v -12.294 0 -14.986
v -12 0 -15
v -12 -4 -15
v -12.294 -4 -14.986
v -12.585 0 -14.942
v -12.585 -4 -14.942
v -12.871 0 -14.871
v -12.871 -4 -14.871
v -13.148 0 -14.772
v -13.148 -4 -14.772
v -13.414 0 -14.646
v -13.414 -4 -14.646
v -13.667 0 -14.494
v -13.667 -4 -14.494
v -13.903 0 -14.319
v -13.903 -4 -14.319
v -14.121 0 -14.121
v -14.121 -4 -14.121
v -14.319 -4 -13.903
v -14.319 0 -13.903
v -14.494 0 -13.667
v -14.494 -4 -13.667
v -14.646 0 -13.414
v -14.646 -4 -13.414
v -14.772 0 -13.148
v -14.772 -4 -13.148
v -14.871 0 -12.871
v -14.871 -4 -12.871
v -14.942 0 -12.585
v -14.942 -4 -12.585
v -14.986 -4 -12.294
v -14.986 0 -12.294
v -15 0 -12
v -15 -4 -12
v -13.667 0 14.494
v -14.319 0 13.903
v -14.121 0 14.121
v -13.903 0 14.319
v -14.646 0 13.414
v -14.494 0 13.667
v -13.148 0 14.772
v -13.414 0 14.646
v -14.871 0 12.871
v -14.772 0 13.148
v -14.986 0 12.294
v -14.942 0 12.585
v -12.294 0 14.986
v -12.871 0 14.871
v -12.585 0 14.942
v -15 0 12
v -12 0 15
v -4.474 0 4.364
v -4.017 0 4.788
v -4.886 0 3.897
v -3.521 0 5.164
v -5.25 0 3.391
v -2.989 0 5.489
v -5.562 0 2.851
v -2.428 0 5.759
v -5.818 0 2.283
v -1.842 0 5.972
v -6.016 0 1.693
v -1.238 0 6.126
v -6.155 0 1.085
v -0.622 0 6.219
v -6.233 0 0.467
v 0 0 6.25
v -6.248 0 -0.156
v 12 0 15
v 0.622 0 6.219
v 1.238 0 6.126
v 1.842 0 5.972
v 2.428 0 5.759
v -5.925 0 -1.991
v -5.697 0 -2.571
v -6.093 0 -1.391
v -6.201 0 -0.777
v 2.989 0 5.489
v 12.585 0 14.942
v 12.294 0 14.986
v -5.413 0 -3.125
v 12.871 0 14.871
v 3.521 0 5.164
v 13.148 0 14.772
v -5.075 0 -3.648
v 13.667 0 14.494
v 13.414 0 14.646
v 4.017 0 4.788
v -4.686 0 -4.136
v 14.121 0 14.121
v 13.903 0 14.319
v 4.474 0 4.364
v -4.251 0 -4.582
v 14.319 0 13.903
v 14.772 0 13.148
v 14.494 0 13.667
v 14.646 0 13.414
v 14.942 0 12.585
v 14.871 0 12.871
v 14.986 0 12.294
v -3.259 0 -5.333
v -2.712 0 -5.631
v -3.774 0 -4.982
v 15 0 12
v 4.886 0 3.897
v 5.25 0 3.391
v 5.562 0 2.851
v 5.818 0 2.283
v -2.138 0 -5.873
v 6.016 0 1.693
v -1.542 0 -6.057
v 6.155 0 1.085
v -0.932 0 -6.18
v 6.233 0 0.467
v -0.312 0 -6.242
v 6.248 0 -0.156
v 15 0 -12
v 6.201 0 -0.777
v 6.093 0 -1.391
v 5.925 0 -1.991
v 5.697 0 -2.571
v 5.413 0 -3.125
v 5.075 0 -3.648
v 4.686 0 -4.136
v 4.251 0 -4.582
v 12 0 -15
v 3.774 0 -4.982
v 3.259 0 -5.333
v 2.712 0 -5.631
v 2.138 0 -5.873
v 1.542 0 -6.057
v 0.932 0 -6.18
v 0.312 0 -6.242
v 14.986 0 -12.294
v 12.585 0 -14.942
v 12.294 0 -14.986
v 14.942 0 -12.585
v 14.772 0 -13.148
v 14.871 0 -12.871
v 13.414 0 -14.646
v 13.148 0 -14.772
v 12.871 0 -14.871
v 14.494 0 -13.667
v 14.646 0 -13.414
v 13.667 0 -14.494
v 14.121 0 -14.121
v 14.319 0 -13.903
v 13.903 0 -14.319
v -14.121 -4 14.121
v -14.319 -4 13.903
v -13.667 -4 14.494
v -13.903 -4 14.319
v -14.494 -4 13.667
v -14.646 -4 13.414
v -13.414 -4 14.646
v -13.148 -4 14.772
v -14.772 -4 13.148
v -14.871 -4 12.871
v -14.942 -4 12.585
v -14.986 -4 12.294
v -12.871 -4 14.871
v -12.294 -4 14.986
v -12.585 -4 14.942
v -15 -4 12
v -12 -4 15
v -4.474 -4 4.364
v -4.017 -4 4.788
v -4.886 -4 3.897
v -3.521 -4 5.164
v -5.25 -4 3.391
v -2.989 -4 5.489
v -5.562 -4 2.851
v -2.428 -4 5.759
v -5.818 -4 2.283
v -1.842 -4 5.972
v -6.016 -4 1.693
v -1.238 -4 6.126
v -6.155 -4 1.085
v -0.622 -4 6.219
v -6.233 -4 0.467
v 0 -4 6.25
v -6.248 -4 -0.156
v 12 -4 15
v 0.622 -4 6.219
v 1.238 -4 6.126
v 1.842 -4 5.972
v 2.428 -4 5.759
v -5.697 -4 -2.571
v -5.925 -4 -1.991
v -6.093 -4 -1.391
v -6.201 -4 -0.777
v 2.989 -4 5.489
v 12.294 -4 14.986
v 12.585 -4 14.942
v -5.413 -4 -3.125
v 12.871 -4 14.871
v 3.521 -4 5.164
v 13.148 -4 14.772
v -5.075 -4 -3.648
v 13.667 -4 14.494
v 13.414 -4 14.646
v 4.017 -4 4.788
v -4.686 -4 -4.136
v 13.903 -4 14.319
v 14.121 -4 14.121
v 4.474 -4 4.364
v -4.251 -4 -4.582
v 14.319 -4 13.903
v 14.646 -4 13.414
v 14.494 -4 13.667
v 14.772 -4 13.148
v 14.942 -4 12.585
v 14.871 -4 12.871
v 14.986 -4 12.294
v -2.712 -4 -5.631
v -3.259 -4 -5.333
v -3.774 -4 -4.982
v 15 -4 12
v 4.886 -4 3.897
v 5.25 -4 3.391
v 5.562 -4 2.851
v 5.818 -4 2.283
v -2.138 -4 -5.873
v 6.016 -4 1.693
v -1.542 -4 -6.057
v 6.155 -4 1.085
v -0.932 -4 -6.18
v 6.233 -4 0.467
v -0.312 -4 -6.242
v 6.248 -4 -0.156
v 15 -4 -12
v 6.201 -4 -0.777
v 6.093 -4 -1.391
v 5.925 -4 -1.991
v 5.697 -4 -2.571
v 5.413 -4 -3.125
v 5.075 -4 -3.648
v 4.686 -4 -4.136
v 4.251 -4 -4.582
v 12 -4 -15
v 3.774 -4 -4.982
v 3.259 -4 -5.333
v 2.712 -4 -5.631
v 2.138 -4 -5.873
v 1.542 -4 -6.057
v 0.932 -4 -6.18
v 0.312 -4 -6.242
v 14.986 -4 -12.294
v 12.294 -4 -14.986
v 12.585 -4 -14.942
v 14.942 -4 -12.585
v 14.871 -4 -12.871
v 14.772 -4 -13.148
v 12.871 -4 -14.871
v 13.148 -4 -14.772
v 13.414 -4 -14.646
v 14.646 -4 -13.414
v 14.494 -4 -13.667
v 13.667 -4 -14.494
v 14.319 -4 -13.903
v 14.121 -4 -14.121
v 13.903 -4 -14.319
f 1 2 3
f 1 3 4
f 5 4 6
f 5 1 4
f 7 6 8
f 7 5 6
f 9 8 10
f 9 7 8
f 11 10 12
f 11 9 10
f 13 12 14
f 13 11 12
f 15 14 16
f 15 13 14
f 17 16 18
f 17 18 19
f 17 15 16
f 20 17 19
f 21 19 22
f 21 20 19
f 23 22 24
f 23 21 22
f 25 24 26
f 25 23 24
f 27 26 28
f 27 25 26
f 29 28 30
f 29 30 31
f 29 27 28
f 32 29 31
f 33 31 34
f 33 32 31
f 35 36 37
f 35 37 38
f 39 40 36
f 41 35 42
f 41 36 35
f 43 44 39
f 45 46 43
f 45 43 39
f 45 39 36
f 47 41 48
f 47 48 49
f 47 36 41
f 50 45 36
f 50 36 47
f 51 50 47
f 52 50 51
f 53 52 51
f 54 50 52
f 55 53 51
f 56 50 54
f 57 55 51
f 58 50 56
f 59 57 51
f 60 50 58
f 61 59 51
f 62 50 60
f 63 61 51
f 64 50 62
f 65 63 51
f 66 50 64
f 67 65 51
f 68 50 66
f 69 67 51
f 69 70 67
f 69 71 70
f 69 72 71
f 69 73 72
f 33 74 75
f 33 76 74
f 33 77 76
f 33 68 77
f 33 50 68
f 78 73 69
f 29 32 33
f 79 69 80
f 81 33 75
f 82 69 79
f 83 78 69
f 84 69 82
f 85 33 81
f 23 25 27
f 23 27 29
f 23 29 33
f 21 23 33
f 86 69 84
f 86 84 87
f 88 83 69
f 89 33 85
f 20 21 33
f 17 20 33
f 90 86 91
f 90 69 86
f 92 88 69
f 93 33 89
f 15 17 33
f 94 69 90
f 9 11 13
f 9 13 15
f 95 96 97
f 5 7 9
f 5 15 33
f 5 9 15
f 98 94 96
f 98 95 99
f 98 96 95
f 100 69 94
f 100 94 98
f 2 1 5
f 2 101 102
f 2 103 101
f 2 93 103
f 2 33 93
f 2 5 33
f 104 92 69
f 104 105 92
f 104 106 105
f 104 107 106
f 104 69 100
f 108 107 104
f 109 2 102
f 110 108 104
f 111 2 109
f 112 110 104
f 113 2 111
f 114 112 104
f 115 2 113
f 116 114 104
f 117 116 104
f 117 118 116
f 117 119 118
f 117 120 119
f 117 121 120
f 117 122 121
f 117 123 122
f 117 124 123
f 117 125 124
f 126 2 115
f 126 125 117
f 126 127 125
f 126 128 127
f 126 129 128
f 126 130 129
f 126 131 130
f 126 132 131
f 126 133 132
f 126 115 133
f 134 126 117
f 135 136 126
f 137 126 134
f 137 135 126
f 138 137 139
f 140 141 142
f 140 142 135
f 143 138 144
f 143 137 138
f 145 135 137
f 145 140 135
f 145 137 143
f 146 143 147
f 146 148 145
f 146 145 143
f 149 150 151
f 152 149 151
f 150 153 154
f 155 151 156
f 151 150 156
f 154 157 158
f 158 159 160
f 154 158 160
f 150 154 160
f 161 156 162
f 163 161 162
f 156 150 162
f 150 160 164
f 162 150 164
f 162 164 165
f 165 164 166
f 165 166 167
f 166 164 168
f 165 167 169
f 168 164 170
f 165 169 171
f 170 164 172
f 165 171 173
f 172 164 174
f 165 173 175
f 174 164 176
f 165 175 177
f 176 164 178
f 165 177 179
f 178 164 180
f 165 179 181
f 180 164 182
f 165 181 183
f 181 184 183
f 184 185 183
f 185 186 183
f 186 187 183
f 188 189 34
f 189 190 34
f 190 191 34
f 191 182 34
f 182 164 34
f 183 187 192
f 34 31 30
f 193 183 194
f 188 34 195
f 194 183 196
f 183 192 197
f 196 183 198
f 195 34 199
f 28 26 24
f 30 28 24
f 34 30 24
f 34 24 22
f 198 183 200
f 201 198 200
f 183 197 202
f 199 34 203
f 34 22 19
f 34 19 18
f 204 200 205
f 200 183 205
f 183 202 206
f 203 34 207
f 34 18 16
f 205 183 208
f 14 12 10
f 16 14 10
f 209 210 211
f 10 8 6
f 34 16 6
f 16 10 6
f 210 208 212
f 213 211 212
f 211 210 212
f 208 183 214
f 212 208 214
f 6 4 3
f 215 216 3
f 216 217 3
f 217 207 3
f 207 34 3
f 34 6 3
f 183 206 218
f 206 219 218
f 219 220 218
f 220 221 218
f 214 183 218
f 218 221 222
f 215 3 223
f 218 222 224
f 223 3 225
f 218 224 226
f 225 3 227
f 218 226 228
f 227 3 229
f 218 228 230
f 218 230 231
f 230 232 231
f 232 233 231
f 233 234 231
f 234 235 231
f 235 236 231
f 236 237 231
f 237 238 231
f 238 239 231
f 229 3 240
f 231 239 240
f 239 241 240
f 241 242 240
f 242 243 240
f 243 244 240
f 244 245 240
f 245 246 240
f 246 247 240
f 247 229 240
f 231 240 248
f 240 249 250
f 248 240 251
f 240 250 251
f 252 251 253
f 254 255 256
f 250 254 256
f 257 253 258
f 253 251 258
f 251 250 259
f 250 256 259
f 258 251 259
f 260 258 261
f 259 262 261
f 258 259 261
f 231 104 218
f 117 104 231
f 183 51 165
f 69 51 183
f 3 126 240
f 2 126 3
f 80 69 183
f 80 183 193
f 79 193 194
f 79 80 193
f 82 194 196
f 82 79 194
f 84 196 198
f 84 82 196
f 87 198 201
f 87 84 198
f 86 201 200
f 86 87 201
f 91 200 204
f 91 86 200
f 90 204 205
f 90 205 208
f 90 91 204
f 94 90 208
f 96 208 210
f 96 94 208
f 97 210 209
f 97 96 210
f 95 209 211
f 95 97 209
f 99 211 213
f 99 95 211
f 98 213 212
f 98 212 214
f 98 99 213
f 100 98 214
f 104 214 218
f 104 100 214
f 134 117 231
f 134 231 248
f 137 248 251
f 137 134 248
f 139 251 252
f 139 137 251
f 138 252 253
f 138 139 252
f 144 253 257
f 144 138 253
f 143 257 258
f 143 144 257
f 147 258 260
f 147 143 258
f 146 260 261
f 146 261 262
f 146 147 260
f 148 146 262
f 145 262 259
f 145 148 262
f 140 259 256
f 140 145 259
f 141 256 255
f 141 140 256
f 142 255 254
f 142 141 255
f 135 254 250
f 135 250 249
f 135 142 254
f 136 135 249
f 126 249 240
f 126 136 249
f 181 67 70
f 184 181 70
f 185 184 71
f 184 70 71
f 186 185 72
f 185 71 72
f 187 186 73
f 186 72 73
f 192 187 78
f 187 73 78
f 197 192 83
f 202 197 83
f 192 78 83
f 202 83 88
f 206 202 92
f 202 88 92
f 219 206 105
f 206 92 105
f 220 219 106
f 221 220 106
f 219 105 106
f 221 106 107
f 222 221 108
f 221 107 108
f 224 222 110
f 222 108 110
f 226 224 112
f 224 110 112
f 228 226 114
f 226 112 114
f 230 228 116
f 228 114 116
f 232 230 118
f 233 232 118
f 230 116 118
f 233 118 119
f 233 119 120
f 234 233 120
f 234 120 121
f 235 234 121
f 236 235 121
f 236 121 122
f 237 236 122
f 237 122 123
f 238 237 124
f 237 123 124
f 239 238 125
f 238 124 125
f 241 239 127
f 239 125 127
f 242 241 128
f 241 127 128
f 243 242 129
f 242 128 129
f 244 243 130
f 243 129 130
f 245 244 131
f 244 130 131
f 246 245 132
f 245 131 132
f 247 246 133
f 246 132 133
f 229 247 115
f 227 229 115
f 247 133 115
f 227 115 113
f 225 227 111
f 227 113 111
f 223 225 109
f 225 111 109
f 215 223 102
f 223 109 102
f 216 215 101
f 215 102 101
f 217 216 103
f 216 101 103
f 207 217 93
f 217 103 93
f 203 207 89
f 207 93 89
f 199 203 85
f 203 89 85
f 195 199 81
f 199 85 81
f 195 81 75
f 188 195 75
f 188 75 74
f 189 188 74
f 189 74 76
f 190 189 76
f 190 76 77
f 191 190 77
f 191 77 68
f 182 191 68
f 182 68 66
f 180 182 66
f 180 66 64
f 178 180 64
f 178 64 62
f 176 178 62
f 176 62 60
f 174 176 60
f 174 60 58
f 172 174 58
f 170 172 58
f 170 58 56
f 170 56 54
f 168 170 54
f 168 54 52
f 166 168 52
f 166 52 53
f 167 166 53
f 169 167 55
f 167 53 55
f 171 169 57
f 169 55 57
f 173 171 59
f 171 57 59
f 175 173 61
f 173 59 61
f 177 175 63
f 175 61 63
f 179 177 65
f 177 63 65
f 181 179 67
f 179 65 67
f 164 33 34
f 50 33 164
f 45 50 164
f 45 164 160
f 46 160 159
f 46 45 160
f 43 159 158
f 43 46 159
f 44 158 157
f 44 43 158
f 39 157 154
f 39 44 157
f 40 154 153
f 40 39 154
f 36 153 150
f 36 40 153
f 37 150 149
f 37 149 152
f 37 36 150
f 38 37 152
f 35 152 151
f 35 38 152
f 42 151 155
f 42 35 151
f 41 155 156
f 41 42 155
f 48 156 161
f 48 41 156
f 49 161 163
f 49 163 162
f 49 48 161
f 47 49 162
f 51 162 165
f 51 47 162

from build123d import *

# Parameters (mm, degrees)
SKETCH_1_R             = 6.25
SM_BASE_FLANGE_1_DEPTH = 4


# Sheet-metal steps are written as plain solids
with BuildPart() as part:
    # Sketch 1 → Базовая кромка1 (new body)
    with BuildSketch(Plane(origin=(0, 0, 0), x_dir=(1, 0, 0), z_dir=(0, 1, 0))):
        with BuildLine():
            Line((12, 15), (-12, 15))
            ThreePointArc((-12, 15), (-14.121320344, 14.121320344), (-15, 12))
            Line((-15, 12), (-15, -12))
            ThreePointArc((-15, -12), (-14.121320344, -14.121320344), (-12, -15))
            Line((-12, -15), (12, -15))
            ThreePointArc((12, -15), (14.121320344, -14.121320344), (15, -12))
            Line((15, -12), (15, 12))
            ThreePointArc((15, 12), (14.121320344, 14.121320344), (12, 15))
        make_face()
        with Locations(Location((0, 0, 0), (0, 0, 270))):
            Circle(SKETCH_1_R, mode=Mode.SUBTRACT)
    extrude(amount=-SM_BASE_FLANGE_1_DEPTH)


solid = part.part
